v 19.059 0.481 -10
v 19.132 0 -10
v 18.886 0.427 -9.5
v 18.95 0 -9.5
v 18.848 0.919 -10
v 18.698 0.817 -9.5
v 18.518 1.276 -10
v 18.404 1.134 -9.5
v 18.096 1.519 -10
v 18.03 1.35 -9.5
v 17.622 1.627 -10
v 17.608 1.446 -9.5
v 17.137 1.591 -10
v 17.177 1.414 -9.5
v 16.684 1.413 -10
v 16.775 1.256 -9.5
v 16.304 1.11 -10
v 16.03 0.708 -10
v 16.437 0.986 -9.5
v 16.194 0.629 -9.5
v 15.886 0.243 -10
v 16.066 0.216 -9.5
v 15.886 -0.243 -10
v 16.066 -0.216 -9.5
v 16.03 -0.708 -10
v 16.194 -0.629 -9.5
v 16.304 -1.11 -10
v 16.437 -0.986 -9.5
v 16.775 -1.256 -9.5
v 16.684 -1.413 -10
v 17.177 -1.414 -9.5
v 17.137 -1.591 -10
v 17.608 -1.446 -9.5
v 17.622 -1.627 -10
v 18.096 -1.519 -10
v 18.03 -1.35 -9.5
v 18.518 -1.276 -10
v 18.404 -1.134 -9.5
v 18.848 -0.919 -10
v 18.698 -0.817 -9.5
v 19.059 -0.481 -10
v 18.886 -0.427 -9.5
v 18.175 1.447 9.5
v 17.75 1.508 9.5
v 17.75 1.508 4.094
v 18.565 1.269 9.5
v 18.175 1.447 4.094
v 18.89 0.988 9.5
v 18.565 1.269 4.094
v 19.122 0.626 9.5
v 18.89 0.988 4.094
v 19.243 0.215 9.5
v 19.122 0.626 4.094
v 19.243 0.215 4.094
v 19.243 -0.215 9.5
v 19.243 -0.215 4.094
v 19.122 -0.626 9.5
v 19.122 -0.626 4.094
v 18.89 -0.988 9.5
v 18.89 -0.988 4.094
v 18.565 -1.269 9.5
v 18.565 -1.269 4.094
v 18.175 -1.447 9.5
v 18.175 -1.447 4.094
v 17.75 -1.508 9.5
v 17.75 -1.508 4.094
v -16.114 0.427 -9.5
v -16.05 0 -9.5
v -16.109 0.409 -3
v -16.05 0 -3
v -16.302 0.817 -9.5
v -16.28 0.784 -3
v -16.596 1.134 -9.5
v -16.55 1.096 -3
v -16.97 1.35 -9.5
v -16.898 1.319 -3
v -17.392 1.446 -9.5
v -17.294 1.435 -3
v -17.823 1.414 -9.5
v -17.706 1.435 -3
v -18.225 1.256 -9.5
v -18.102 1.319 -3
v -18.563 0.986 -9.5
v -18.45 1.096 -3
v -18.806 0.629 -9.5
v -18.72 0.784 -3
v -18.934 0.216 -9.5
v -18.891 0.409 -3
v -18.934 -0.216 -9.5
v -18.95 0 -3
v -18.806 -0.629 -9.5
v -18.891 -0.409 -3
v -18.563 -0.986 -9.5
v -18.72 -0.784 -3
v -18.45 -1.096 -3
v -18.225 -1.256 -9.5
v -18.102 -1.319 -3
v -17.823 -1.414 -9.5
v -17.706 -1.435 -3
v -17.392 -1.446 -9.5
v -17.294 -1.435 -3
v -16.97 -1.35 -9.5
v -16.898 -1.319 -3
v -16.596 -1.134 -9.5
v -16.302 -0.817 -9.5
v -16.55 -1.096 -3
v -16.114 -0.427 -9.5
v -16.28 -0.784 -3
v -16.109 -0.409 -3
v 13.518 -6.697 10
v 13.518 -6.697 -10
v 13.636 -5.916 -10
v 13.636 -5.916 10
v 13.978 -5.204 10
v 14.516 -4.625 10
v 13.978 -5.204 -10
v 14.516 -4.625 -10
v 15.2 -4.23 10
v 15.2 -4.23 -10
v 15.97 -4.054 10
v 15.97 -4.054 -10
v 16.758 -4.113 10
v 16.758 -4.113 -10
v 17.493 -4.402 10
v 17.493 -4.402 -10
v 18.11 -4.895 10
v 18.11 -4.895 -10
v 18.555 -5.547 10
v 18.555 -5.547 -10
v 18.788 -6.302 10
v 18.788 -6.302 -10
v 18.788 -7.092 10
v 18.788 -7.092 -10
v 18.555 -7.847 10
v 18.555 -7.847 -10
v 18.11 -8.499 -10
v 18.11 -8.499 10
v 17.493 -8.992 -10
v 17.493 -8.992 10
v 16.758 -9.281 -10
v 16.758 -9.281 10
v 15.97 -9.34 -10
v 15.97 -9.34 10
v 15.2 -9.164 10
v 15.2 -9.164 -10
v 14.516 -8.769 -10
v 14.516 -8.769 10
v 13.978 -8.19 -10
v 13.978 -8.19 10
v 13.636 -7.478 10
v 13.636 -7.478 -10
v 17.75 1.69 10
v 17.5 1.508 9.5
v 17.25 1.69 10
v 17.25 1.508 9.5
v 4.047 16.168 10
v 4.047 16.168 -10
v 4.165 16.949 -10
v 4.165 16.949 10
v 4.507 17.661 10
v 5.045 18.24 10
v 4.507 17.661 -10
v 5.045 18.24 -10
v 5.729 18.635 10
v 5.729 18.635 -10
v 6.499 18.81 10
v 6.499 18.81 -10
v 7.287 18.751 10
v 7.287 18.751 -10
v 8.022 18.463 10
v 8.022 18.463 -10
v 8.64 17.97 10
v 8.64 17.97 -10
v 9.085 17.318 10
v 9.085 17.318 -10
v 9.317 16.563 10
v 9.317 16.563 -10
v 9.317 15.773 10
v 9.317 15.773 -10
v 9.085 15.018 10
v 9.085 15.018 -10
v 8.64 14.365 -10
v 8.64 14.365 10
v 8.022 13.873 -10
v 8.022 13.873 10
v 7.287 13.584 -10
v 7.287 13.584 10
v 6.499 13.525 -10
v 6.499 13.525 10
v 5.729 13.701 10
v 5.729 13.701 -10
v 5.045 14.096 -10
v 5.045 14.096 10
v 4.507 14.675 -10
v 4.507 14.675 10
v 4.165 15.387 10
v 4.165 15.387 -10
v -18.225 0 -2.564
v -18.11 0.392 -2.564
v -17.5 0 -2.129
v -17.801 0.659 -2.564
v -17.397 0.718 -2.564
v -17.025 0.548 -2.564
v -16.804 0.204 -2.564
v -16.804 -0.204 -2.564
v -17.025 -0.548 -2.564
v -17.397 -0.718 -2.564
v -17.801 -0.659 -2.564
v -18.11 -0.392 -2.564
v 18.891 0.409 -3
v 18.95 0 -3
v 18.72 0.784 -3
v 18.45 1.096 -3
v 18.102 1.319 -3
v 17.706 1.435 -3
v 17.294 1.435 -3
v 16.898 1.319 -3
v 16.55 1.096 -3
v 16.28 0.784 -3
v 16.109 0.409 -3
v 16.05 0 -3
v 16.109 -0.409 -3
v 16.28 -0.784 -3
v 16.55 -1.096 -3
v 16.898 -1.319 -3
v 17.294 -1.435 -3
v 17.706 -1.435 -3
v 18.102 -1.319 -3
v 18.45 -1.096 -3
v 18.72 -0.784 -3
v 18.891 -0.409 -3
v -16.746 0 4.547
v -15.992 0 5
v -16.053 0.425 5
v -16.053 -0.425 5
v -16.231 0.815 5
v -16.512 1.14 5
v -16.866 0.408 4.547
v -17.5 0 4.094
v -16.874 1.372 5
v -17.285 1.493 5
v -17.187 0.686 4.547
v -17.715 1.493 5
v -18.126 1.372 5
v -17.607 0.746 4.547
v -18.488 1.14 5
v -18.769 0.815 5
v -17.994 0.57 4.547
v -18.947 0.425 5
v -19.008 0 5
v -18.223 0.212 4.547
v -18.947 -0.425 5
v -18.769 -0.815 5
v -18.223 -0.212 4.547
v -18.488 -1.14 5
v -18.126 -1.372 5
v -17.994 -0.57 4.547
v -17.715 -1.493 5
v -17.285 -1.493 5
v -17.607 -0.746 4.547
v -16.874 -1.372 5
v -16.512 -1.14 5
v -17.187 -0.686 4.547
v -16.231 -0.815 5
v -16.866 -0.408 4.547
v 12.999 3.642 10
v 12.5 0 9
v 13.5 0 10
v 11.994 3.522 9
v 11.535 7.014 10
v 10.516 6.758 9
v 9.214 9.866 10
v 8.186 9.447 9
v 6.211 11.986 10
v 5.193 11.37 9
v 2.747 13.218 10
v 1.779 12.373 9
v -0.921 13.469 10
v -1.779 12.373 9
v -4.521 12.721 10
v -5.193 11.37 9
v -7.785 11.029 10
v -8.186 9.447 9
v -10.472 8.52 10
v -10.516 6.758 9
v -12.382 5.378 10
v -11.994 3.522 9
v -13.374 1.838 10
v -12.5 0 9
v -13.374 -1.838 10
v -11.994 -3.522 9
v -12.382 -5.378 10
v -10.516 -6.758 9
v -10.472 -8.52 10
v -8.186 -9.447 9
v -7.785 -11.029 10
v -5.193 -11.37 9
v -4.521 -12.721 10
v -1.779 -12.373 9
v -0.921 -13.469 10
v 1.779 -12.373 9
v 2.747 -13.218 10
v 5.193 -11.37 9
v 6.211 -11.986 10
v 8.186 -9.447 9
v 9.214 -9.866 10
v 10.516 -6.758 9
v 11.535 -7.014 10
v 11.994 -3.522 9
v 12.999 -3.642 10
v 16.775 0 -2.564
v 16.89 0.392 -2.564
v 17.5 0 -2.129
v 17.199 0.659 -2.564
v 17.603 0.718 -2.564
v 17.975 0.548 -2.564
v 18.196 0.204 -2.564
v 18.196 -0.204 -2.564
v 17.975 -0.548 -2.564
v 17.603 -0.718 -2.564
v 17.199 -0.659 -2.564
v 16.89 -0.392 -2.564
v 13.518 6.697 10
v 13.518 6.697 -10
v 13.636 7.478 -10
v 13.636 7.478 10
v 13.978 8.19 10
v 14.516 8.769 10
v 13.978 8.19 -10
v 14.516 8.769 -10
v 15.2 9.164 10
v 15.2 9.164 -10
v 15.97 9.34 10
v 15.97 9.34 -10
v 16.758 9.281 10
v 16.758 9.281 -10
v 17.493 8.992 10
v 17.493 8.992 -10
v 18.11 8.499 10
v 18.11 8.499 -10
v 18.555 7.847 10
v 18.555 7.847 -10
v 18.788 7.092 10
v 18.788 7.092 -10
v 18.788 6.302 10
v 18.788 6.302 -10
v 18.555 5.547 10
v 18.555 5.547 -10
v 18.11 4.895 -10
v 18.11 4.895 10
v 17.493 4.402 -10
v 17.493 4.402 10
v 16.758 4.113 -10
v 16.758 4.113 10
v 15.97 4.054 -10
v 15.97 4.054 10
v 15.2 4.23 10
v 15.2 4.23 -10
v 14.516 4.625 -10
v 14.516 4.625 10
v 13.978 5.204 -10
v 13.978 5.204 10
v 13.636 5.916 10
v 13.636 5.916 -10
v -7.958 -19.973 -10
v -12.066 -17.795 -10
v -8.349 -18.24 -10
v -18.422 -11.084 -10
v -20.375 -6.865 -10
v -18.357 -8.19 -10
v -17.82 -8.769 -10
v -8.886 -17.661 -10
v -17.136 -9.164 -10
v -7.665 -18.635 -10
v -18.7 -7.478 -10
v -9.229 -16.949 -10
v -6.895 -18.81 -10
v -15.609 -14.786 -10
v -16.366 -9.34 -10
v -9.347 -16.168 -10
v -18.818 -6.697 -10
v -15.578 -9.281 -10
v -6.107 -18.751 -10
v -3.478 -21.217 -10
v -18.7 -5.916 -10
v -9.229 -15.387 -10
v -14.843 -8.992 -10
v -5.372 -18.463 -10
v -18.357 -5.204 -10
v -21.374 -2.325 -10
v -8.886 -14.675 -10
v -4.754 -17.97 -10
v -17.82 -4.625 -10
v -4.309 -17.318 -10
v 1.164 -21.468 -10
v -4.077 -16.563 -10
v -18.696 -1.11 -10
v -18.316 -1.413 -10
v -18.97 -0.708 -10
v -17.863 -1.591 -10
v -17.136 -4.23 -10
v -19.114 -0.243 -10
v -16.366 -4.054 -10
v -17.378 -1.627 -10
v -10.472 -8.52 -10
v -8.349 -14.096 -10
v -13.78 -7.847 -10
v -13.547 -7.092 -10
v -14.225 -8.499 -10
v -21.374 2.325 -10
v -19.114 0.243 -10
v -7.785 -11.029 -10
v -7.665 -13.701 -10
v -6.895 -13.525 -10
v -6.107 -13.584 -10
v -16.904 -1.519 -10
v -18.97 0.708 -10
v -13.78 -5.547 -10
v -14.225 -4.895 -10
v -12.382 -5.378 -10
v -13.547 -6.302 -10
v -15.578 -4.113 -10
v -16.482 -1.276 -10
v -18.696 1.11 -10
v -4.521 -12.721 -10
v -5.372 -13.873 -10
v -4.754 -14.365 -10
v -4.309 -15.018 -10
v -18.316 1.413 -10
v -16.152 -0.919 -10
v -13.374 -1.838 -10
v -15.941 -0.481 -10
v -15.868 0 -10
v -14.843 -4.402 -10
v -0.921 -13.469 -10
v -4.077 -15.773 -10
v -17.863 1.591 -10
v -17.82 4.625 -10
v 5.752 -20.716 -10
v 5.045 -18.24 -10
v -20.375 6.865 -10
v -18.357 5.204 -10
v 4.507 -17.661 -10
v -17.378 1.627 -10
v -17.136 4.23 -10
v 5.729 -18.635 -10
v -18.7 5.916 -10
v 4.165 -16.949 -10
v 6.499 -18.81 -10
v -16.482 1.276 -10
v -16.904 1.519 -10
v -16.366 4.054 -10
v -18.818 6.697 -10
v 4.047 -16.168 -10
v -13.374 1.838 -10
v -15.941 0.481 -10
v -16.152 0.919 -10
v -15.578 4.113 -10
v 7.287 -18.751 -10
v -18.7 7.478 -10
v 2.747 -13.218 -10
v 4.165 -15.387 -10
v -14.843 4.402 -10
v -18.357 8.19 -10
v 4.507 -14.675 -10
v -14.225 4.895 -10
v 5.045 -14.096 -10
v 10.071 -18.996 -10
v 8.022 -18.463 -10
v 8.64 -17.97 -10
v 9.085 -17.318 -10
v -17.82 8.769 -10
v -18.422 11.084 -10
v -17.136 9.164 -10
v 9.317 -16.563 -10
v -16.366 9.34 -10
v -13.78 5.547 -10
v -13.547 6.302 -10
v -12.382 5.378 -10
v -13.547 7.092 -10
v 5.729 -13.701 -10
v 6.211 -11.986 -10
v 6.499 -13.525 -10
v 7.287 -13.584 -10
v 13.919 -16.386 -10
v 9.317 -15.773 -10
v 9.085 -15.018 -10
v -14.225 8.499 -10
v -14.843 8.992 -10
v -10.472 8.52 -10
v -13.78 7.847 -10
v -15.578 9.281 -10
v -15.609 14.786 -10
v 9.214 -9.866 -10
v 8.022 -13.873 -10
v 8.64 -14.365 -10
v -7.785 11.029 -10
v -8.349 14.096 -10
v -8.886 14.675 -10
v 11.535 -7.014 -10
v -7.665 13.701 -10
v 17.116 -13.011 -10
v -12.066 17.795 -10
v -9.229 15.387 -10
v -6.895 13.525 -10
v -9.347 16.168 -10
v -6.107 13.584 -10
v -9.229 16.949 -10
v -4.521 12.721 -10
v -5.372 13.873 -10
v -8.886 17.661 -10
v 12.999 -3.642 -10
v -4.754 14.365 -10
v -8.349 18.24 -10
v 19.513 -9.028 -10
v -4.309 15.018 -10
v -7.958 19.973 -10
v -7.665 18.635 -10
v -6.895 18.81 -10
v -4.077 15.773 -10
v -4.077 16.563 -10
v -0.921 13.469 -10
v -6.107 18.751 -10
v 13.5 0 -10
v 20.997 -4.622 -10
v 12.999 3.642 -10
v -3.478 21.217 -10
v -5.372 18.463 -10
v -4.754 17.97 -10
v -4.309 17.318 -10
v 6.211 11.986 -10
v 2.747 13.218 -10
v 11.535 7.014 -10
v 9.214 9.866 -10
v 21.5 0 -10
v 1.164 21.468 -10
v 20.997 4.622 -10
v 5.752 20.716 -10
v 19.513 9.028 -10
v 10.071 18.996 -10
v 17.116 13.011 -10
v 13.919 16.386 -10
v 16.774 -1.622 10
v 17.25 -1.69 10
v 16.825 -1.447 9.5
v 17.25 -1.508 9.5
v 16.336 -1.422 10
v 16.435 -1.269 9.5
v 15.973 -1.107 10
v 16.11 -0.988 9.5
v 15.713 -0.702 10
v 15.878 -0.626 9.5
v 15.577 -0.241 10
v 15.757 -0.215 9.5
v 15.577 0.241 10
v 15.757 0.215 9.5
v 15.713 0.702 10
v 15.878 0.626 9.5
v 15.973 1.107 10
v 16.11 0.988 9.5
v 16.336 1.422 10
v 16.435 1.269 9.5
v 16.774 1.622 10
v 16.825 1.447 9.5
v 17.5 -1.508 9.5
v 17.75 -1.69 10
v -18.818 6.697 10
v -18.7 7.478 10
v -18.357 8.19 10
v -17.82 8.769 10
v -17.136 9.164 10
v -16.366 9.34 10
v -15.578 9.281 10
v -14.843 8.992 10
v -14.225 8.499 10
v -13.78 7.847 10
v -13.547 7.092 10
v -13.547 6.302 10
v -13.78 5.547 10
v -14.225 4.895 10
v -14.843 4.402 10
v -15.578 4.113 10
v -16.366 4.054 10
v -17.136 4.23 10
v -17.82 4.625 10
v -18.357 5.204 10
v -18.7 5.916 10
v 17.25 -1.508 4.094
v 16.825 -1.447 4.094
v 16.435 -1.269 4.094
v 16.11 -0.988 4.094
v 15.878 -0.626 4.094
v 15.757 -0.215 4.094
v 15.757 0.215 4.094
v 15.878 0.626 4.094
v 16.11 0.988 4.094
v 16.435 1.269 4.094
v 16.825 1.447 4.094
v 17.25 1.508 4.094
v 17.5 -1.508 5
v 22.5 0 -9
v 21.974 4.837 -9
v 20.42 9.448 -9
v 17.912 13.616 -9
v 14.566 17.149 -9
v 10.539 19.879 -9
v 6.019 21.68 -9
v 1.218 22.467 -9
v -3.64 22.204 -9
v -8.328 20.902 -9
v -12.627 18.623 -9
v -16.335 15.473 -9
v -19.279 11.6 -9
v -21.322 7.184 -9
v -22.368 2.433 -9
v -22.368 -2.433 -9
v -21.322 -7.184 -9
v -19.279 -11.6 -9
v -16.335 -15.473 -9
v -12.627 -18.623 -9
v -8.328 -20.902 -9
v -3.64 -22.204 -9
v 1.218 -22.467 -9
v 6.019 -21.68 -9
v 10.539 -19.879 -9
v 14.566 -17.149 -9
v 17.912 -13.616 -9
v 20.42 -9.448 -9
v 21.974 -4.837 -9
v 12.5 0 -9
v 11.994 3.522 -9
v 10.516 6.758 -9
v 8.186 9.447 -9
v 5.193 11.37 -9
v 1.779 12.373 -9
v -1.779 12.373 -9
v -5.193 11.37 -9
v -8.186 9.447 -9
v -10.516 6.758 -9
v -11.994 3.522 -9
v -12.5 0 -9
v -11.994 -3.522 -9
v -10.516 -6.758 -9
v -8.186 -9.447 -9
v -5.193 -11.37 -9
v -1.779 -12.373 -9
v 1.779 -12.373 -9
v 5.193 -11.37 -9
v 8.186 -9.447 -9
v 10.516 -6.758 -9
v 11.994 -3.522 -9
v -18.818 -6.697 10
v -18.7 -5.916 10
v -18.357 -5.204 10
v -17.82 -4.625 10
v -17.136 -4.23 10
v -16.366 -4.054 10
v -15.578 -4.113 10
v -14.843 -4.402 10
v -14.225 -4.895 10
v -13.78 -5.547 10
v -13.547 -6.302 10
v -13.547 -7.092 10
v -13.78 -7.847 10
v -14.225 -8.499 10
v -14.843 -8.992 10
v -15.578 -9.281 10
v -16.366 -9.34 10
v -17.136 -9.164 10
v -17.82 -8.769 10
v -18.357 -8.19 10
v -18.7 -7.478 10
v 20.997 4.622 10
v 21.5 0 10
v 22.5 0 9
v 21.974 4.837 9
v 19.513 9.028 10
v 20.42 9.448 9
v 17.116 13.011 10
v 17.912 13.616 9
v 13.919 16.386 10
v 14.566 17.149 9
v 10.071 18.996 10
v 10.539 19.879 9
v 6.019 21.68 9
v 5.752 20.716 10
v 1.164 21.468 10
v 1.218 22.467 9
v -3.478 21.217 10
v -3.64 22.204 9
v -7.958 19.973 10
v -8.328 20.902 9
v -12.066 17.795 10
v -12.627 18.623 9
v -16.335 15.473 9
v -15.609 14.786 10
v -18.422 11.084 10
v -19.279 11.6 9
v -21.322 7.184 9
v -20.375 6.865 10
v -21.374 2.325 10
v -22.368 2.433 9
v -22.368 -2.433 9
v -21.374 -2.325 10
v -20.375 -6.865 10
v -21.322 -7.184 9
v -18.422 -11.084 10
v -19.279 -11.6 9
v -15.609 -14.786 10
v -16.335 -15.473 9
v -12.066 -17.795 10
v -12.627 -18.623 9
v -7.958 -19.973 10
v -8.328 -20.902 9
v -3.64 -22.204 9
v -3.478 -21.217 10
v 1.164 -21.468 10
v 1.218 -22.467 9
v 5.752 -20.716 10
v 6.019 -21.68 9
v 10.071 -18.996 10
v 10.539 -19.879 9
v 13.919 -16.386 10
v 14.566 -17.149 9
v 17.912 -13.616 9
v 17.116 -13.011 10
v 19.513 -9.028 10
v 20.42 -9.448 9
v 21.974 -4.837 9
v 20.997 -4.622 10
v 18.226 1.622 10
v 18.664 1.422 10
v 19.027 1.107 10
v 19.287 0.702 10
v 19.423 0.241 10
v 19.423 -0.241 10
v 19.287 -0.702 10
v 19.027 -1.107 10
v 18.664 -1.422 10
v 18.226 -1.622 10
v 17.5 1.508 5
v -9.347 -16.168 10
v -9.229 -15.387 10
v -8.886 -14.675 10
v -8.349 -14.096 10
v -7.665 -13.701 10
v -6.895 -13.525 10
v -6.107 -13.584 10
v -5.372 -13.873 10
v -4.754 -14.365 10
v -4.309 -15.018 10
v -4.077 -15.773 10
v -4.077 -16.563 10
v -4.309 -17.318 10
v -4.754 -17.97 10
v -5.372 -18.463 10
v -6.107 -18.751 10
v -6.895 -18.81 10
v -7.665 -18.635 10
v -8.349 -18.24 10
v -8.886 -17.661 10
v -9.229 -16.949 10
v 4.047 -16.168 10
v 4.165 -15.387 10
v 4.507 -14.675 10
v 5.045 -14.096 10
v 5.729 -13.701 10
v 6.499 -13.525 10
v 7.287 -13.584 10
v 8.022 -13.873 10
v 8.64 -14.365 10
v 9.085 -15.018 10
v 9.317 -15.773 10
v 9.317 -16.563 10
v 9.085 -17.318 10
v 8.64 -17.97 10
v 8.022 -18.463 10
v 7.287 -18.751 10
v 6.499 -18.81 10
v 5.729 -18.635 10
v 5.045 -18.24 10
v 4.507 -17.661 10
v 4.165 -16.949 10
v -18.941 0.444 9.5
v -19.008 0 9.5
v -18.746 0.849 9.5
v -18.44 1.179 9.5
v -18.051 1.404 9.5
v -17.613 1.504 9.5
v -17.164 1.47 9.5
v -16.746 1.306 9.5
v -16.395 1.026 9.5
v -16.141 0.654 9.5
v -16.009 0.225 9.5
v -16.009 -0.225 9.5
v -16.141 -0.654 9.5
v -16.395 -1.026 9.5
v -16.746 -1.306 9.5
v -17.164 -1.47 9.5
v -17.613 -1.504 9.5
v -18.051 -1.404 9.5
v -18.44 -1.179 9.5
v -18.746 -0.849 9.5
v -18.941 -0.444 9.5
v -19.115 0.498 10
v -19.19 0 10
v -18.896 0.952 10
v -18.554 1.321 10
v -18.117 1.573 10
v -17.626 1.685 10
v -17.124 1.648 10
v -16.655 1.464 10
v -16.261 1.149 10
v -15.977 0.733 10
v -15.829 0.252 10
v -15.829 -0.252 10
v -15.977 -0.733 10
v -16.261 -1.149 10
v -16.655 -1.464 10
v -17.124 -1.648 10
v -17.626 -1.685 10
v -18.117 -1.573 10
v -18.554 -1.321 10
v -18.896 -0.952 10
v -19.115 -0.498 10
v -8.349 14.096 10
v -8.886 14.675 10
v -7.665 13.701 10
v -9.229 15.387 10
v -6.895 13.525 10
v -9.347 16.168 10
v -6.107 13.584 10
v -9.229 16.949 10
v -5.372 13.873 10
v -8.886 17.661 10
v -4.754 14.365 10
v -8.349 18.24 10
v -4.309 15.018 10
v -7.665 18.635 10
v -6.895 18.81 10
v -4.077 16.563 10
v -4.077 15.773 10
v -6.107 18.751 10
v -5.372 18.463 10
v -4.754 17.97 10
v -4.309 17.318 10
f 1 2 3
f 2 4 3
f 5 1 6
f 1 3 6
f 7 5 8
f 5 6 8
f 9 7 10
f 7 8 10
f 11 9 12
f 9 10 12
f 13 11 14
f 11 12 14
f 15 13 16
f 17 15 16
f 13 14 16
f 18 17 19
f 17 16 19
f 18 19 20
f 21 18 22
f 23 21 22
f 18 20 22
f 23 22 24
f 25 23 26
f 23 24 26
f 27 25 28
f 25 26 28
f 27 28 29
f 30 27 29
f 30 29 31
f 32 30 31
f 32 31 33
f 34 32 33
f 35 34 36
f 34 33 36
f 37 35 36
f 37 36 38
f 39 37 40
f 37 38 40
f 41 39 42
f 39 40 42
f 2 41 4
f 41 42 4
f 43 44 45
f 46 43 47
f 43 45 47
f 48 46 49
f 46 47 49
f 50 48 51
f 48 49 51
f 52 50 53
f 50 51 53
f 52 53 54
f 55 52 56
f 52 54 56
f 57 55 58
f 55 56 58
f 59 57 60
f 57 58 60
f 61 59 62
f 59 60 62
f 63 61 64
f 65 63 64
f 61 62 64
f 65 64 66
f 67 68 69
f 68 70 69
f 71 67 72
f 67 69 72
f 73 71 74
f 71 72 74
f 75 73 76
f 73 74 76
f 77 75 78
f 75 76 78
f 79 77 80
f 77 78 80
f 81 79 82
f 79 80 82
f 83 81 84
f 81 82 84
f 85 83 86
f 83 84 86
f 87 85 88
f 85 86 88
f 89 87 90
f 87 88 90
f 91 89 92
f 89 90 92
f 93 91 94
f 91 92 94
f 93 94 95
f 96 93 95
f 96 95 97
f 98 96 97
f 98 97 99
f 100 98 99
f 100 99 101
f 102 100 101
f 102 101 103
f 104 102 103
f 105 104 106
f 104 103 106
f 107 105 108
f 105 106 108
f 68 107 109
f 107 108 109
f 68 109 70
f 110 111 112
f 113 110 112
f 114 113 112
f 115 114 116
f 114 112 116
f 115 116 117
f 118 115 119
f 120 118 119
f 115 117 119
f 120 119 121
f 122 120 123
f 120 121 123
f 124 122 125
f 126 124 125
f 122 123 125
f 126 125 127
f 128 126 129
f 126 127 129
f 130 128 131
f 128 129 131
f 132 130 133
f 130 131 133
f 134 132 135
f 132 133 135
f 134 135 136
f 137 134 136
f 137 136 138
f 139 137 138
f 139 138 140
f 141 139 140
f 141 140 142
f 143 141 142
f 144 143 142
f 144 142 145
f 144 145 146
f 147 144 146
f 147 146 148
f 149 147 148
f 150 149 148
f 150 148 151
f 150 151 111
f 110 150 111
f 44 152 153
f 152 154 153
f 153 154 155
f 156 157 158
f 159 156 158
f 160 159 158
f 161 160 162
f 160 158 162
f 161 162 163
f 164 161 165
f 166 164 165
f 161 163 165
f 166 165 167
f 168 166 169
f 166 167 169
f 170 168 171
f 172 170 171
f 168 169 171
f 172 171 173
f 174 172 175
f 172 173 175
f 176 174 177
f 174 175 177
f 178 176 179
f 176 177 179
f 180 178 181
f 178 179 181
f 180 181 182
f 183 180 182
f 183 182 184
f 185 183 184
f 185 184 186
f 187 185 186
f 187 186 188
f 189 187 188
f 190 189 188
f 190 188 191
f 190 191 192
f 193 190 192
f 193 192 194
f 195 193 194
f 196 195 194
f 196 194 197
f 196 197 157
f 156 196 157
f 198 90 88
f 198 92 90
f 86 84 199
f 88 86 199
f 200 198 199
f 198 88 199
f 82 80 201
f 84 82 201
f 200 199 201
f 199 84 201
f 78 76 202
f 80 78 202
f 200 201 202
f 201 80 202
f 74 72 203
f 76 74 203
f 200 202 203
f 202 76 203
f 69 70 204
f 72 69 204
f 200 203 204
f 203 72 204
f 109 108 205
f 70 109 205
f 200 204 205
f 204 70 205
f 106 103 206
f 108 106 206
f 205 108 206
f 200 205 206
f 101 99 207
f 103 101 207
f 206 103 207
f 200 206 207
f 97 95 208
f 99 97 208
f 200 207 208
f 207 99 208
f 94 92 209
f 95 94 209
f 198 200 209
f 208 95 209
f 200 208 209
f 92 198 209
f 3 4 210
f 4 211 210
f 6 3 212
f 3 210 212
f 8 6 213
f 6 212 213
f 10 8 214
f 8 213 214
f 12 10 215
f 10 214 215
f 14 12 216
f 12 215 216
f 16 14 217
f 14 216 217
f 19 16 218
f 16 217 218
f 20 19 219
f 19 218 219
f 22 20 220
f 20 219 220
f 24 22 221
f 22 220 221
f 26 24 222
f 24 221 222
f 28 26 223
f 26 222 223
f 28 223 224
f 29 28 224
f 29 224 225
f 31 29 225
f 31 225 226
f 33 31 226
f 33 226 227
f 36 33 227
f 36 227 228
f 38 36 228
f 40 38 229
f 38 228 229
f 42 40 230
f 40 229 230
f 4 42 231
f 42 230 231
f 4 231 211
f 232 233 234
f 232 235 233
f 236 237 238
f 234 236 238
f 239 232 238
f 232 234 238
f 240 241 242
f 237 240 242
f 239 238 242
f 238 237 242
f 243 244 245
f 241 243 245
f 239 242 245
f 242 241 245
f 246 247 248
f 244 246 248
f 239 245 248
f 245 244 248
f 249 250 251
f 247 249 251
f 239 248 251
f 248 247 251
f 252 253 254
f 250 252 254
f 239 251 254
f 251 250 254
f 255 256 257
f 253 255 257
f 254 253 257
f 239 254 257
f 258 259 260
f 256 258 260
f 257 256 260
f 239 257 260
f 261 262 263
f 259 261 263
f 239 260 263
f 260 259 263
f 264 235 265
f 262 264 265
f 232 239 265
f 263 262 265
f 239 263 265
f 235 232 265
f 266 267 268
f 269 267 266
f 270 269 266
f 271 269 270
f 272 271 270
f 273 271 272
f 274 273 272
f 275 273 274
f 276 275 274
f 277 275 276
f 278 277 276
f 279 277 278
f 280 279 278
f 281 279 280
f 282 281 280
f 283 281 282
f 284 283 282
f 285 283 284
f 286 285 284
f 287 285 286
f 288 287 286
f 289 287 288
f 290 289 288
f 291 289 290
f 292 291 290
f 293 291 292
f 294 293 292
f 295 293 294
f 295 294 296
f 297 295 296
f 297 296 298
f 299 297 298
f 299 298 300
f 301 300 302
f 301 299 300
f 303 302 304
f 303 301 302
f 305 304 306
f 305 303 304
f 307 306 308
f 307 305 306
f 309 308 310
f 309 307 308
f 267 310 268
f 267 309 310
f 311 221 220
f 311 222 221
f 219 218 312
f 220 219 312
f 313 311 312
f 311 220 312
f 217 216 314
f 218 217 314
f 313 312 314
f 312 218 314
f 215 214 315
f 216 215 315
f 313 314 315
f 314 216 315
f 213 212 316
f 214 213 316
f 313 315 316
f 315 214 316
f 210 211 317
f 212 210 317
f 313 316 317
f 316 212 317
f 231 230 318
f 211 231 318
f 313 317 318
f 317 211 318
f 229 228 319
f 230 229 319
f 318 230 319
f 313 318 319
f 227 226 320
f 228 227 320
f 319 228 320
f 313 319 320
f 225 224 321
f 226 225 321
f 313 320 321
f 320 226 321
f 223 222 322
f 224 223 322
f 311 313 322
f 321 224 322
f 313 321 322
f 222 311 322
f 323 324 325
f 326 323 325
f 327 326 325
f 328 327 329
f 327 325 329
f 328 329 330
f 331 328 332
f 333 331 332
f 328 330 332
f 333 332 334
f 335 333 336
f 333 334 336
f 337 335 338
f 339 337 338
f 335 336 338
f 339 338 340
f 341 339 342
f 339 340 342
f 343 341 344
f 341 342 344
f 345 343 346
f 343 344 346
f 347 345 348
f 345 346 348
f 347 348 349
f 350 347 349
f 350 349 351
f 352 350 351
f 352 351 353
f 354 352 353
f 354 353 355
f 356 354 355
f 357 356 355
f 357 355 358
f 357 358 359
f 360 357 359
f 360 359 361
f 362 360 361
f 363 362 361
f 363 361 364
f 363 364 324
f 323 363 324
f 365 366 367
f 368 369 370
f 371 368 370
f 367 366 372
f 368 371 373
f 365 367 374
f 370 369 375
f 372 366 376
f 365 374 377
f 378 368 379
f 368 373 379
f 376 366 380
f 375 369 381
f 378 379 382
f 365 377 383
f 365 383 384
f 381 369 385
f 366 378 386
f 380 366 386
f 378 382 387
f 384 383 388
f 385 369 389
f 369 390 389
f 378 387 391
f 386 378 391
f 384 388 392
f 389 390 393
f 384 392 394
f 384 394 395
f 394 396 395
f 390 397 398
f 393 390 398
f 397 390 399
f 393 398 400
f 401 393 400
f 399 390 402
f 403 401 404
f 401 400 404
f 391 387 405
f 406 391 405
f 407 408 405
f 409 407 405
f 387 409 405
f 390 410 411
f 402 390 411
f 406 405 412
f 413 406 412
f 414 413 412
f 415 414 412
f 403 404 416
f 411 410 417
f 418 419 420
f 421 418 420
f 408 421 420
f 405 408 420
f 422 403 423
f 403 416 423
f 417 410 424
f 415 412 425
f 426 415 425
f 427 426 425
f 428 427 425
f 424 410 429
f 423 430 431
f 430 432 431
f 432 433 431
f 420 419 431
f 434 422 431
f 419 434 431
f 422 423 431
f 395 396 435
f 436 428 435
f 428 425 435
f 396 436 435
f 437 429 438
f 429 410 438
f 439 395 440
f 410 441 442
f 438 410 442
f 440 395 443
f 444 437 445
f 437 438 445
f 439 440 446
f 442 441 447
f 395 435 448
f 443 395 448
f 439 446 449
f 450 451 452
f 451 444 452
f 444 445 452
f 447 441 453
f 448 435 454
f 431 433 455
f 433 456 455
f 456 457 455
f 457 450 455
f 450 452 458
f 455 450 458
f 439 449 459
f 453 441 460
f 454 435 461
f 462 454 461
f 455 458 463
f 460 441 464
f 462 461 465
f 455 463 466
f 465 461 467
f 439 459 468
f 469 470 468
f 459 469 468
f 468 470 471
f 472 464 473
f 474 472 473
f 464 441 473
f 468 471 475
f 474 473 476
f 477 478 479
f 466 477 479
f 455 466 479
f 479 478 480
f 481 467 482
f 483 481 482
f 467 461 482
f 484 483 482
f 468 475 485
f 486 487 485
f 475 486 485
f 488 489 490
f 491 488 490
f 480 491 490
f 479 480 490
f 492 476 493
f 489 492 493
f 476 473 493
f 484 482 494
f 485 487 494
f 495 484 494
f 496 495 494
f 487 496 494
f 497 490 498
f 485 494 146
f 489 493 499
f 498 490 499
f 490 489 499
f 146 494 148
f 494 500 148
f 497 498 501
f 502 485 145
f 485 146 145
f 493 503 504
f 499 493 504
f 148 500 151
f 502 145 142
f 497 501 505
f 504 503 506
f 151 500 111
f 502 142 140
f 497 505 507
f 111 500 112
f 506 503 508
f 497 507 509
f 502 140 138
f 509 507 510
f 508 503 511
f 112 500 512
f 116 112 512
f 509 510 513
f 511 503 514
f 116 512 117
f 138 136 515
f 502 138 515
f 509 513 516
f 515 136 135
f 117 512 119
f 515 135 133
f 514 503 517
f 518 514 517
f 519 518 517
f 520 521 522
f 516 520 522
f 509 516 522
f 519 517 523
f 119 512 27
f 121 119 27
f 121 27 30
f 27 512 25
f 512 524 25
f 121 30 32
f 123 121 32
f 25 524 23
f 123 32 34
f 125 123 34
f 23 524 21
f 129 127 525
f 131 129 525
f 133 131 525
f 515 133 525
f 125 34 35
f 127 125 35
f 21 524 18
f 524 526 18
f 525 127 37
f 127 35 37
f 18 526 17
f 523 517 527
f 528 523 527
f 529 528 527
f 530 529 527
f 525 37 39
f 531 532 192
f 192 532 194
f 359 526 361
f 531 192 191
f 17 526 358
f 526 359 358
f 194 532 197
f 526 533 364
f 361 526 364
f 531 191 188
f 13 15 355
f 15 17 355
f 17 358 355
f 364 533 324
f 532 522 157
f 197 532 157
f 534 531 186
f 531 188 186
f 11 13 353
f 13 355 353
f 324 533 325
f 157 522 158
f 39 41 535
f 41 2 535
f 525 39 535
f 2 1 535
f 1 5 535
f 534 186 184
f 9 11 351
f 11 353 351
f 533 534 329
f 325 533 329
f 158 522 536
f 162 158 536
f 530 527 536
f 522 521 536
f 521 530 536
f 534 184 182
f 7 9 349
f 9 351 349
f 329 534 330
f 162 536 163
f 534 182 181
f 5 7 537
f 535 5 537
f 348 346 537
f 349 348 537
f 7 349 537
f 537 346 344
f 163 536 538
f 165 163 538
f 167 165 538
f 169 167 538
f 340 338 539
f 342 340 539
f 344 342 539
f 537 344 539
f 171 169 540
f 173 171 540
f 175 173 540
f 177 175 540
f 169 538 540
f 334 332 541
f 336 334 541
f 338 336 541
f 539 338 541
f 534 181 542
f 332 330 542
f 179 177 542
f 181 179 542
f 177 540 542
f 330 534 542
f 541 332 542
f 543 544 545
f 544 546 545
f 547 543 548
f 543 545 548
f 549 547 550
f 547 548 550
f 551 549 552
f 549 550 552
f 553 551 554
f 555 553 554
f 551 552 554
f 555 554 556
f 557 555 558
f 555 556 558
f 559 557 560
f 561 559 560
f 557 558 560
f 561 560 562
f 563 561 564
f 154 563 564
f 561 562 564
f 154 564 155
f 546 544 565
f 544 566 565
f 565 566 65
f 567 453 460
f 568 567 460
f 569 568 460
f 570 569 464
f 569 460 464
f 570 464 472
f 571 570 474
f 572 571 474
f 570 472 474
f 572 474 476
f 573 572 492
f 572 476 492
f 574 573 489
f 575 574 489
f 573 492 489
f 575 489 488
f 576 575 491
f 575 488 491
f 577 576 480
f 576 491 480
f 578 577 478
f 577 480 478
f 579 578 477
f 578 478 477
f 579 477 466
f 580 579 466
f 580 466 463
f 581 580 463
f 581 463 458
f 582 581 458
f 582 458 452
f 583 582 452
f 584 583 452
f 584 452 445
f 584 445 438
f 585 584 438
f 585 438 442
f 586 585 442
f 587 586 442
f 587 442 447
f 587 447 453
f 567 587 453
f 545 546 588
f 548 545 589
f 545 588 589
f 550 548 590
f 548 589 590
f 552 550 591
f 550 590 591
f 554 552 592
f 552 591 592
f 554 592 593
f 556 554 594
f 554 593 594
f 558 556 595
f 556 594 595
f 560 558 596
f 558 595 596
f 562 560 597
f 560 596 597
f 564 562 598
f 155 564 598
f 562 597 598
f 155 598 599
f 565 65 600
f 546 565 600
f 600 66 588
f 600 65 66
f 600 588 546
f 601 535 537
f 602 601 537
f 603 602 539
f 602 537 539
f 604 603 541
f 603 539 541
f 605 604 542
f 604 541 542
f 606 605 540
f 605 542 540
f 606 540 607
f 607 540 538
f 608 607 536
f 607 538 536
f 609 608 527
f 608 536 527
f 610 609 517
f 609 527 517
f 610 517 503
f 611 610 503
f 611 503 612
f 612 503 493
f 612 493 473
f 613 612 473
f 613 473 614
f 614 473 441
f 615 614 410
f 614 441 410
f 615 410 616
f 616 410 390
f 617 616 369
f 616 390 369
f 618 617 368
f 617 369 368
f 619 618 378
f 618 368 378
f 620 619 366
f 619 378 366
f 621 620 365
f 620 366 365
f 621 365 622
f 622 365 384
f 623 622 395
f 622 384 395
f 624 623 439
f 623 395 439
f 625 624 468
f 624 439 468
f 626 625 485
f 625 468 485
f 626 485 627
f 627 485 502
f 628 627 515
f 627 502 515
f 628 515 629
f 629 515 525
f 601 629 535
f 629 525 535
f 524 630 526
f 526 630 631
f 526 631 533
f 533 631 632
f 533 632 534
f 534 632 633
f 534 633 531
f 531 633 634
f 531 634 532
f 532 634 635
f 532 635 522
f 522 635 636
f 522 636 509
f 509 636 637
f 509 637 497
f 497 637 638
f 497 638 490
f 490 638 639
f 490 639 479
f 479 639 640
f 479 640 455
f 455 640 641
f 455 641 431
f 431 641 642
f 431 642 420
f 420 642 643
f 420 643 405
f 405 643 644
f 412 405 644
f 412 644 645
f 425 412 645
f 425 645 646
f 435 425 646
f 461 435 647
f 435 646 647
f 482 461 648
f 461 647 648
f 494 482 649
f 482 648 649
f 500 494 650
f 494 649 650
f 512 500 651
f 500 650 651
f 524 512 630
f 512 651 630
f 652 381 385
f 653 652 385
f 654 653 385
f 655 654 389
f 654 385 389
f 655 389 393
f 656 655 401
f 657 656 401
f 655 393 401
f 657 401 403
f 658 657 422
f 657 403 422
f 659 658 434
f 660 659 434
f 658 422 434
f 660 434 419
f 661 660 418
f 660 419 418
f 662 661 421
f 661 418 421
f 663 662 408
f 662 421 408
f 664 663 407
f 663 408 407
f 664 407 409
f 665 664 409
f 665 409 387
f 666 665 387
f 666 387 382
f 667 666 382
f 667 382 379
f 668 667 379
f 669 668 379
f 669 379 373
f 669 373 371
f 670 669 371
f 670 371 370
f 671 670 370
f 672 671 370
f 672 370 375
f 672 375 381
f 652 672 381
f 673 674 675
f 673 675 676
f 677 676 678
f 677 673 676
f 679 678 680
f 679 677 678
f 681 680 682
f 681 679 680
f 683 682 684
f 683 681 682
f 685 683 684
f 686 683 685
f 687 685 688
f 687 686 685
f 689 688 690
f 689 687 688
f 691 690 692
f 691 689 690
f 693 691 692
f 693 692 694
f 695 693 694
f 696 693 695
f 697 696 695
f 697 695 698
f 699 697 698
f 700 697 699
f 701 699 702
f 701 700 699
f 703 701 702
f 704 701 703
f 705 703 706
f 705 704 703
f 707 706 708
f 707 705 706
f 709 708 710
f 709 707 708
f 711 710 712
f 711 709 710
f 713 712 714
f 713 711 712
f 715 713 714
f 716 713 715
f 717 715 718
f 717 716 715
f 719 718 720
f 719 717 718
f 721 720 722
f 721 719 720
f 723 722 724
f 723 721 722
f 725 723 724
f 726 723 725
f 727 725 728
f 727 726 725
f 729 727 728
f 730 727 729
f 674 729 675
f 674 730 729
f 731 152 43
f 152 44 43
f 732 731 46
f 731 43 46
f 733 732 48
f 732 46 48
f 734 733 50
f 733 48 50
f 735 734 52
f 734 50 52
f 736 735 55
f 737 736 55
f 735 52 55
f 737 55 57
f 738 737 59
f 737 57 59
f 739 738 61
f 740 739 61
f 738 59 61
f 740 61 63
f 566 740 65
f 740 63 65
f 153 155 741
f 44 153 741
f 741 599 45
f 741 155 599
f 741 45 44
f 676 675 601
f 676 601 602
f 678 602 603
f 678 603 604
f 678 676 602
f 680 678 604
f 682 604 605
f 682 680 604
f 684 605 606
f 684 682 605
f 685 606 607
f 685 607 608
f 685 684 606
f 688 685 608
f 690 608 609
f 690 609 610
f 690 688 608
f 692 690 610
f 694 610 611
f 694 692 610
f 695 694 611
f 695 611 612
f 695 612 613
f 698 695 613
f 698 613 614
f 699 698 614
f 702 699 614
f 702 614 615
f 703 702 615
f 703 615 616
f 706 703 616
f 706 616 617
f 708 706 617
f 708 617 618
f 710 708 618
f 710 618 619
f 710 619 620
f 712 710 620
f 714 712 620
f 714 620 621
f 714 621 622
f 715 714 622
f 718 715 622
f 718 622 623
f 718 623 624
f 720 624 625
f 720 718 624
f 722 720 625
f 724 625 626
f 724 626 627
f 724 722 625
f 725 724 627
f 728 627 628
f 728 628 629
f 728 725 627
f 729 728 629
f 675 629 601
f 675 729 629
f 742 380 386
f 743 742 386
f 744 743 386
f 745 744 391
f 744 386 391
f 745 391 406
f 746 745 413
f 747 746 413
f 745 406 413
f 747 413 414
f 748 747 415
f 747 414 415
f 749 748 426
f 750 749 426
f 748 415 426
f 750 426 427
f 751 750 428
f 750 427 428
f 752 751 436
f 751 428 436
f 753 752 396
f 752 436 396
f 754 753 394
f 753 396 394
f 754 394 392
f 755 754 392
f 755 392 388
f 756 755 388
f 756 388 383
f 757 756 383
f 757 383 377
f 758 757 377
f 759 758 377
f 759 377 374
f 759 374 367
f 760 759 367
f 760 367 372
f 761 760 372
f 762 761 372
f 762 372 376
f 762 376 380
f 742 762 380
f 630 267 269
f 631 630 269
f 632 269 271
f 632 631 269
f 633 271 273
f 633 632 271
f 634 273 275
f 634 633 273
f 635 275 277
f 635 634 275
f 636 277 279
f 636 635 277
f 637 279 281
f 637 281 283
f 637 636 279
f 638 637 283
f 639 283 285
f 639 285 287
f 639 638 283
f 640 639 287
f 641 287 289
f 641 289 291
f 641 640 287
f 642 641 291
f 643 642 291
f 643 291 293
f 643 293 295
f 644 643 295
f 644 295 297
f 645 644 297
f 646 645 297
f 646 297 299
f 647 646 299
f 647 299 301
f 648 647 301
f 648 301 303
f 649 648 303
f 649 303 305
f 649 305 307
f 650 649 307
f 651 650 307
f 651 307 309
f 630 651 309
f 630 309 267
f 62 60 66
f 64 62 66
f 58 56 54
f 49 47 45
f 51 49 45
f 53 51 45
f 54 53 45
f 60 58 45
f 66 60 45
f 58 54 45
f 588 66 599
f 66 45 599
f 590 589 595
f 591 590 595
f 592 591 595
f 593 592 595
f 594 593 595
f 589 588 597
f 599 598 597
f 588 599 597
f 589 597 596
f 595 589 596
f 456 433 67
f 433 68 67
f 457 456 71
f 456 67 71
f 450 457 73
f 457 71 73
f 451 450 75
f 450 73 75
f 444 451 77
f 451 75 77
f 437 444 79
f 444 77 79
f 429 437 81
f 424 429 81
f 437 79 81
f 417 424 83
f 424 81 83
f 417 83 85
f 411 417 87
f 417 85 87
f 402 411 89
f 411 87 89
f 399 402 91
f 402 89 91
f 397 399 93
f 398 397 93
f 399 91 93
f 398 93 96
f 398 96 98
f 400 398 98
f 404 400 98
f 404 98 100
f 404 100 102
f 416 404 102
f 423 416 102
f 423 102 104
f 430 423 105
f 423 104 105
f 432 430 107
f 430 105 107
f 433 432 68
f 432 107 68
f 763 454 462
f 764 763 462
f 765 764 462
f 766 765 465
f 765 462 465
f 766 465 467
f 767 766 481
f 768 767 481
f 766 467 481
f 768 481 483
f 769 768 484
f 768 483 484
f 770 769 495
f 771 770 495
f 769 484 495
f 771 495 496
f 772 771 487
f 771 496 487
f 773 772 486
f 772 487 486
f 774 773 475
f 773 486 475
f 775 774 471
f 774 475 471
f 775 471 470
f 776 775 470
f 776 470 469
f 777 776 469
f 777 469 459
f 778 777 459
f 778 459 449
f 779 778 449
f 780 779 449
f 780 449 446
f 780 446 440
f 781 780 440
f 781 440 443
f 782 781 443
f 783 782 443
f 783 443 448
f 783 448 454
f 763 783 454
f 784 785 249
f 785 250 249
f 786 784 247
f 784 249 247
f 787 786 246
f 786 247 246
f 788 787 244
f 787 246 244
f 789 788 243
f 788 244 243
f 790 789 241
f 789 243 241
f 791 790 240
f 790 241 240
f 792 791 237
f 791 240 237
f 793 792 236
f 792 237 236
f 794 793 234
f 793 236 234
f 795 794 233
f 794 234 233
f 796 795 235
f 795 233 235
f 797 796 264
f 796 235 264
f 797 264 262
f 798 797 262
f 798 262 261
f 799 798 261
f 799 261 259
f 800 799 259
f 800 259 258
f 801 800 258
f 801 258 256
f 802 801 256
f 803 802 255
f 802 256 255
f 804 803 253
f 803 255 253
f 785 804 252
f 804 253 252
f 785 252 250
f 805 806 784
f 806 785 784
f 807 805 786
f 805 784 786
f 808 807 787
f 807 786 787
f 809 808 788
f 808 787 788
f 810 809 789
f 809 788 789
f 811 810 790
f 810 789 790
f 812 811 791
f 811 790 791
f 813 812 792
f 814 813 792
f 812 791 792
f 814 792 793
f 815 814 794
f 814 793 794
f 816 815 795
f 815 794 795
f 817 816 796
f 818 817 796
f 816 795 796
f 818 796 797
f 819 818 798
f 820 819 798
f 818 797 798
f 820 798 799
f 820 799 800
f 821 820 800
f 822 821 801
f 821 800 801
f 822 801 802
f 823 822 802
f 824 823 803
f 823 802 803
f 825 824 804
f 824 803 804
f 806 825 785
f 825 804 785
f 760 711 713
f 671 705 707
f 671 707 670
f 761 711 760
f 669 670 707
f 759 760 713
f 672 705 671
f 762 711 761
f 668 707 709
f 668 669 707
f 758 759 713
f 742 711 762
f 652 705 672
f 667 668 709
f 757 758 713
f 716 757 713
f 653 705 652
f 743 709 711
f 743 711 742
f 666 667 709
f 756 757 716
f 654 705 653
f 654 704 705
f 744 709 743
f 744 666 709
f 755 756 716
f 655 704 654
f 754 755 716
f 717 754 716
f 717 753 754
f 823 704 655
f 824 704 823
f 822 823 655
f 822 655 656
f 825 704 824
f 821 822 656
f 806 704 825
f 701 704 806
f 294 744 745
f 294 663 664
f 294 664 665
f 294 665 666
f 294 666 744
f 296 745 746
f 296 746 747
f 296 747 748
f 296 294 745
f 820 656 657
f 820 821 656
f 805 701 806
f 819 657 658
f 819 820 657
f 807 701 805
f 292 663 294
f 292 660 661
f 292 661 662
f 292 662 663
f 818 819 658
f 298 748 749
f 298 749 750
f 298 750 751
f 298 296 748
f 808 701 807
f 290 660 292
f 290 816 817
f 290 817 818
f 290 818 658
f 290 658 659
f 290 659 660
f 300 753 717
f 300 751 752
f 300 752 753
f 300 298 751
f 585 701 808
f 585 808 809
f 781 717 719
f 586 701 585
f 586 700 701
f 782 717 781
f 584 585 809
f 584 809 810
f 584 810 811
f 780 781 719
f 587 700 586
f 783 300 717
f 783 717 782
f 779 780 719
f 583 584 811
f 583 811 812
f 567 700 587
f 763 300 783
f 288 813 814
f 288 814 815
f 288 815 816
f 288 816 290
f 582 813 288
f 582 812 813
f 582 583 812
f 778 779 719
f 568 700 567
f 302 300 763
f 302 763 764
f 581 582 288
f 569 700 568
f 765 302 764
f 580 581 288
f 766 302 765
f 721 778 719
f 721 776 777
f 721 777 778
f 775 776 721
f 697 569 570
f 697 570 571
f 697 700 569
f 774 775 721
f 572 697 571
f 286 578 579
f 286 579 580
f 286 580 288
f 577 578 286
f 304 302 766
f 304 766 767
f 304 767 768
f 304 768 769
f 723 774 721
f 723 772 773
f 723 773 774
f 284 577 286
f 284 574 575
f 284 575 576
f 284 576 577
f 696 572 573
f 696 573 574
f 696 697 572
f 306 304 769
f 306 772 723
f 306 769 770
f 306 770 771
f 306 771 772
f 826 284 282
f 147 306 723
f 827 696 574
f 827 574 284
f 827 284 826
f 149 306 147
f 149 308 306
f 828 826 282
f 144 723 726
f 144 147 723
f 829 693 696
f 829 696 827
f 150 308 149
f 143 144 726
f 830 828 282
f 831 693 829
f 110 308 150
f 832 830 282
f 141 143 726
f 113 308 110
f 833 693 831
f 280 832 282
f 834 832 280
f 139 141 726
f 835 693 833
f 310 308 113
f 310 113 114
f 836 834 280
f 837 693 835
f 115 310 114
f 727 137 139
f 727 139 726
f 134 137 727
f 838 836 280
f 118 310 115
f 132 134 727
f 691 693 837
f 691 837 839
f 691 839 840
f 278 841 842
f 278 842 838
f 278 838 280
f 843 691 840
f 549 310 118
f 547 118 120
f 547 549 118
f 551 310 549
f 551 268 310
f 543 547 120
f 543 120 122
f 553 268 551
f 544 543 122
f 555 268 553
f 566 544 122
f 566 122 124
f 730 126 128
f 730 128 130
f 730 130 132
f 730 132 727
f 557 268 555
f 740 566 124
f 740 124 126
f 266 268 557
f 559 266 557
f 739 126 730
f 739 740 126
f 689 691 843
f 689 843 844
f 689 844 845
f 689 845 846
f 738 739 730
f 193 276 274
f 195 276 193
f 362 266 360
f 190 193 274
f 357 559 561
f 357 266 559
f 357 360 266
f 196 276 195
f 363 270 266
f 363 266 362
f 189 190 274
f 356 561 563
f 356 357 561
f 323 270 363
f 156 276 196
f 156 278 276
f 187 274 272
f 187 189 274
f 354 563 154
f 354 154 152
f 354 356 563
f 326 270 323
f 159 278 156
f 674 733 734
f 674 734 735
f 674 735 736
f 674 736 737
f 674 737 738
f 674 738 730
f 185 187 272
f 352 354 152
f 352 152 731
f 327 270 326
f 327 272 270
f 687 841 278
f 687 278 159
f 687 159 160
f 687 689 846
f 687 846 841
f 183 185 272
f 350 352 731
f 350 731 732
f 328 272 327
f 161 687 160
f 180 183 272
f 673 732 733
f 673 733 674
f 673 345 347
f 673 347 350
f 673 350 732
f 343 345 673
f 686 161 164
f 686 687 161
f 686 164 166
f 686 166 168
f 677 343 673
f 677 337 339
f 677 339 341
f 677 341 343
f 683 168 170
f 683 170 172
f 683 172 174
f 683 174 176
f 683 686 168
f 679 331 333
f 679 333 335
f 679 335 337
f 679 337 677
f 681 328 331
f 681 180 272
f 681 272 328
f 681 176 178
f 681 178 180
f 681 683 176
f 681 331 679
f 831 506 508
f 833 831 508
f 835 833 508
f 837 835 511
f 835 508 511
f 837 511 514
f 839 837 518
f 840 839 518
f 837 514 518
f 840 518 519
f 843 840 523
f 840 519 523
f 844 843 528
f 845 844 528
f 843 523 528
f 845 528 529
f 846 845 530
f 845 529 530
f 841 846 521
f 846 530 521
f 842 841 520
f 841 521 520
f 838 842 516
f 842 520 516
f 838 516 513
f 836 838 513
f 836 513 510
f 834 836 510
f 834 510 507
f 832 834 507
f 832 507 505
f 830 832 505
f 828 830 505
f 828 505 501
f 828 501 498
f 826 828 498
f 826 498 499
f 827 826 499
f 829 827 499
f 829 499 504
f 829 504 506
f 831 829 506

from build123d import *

# Parameters (mm, degrees)
SKETCH1_R                           = 22.5
SKETCH1_R_2                         = 12.5
BOSS_EXTRUDE1_DEPTH                 = 10
M5_CLEARANCE_HOLE1_D                = 5.3
F_3_0MM_CLEARANCE_DOWEL_HOLE1_D     = 3.016
F_3_0MM_CLEARANCE_DOWEL_HOLE1_DEPTH = 5
F_3_0MM_CLEARANCE_DOWEL_HOLE1_TIP   = 0.906097813
F_2_9_2_9_DIAMETER_HOLE1_D          = 2.9
F_2_9_2_9_DIAMETER_HOLE1_DEPTH      = 7
F_2_9_2_9_DIAMETER_HOLE1_TIP        = 0.871247898
CUT_EXTRUDE1_START                  = -5.906098
CUT_EXTRUDE1_DEPTH                  = 5.906098
CHAMFER1_SIZE                       = 1
CHAMFER2_SIZE                       = 0.181985117
CHAMFER2_SIZE_2                     = 0.5


with BuildPart() as part:
    # Sketch1 → Boss-Extrude1 (new, symmetric)
    with BuildSketch(Plane.XY):
        Circle(SKETCH1_R)
        Circle(SKETCH1_R_2, mode=Mode.SUBTRACT)
    extrude(amount=BOSS_EXTRUDE1_DEPTH, both=True)

    # M5 Clearance Hole1 (through all)
    with Locations(Plane.XY.offset(10)):
        with Locations((6.696960066, -16.167891819), (16.167891819, -6.696960066), (16.167891819, 6.696960066), (6.696960066, 16.167891819), (-6.696960066, 16.167891819), (-16.167891819, 6.696960066), (-16.167891819, -6.696960066), (-6.696960066, -16.167891819)):
            Hole(M5_CLEARANCE_HOLE1_D / 2)

    # Ø3.0mm Clearance Dowel Hole1
    with Locations(Plane.XY.offset(10)):
        with Locations((-17.5, 0), (17.5, 0)):
            Hole(F_3_0MM_CLEARANCE_DOWEL_HOLE1_D / 2, depth=F_3_0MM_CLEARANCE_DOWEL_HOLE1_DEPTH)
            with Locations((0, 0, -(F_3_0MM_CLEARANCE_DOWEL_HOLE1_DEPTH + F_3_0MM_CLEARANCE_DOWEL_HOLE1_TIP / 2))):  # 118° drill point
                Cone(0, F_3_0MM_CLEARANCE_DOWEL_HOLE1_D / 2, F_3_0MM_CLEARANCE_DOWEL_HOLE1_TIP, mode=Mode.SUBTRACT)

    # Ø2.9 (2.9) Diameter Hole1
    with Locations(Plane(origin=(0, 0, -10), x_dir=(-1, 0, 0), z_dir=(0, 0, -1))):
        with Locations((-17.5, 0), (17.5, 0)):
            Hole(F_2_9_2_9_DIAMETER_HOLE1_D / 2, depth=F_2_9_2_9_DIAMETER_HOLE1_DEPTH)
            with Locations((0, 0, -(F_2_9_2_9_DIAMETER_HOLE1_DEPTH + F_2_9_2_9_DIAMETER_HOLE1_TIP / 2))):  # 118° drill point
                Cone(0, F_2_9_2_9_DIAMETER_HOLE1_D / 2, F_2_9_2_9_DIAMETER_HOLE1_TIP, mode=Mode.SUBTRACT)

    # Sketch8 → Cut-Extrude1 (cut)
    with BuildSketch(Plane.XY.offset(10).offset(CUT_EXTRUDE1_START)):
        with BuildLine():
            Line((17.25, 1.508), (17.75, 1.508))
            ThreePointArc((17.75, 1.508), (19.258, 0), (17.75, -1.508))
            Line((17.75, -1.508), (17.25, -1.508))
            ThreePointArc((17.25, -1.508), (15.742, 0), (17.25, 1.508))
        make_face()
    extrude(amount=CUT_EXTRUDE1_DEPTH, mode=Mode.SUBTRACT)

    # Chamfer1
    chamfer1_edges = [part.edges().sort_by_distance(p)[0] for p in [
        (-22.5, 0, -10),
        (-22.5, 0, 10),
        (-12.5, 0, -10),
        (-12.5, 0, 10),
    ]]
    chamfer(chamfer1_edges, length=CHAMFER1_SIZE)

    # Chamfer2
    # the kernel refuses this chamfer: 0.5, 0.181985117 mm, written as the material it takes off along each edge
    with BuildSketch(Plane(origin=(-17.5, 0, 10), x_dir=(-1, 0, 0), z_dir=(0, -1, 0))) as chamfer2_piece_1:
        Polygon((1.508 + CHAMFER2_SIZE, 0), (1.508, CHAMFER2_SIZE_2), (1.508, 0), align=None)
    revolve(axis=Axis((-17.5, 0, 10), (0, 0, -1)), mode=Mode.SUBTRACT)
    with BuildSketch(Plane(origin=(-17.5, 0, -10), x_dir=(1, 0, 0), z_dir=(0, -1, 0))) as chamfer2_piece_2:
        Polygon((1.45 + CHAMFER2_SIZE, 0), (1.45, CHAMFER2_SIZE_2), (1.45, 0), align=None)
    revolve(axis=Axis((-17.5, 0, -10), (0, 0, 1)), mode=Mode.SUBTRACT)
    with BuildSketch(Plane(origin=(17.5, 0, -10), x_dir=(1, 0, 0), z_dir=(0, -1, 0))) as chamfer2_piece_3:
        Polygon((1.45 + CHAMFER2_SIZE, 0), (1.45, CHAMFER2_SIZE_2), (1.45, 0), align=None)
    revolve(axis=Axis((17.5, 0, -10), (0, 0, 1)), mode=Mode.SUBTRACT)
    with BuildSketch(Plane(origin=(17.75, -1.508, 10), x_dir=(0, -0.9950833631817482, 0.09904090225205342), z_dir=(-1, 0, 0)), Plane(origin=(17.5, 1.508, 10), x_dir=(0, 0.9950833631817482, 0.09904090225205342), z_dir=(1, 0, 0)), Plane(origin=(17.5, -1.508, 10), x_dir=(0, -0.9950833631817482, 0.09904090225205342), z_dir=(-1, 0, 0)), Plane(origin=(17.25, 1.508, 10), x_dir=(0, 0.9950833631817482, 0.09904090225205342), z_dir=(1, 0, 0))) as chamfer2_piece_4:
        Polygon((CHAMFER2_SIZE * 0.99508336391, -CHAMFER2_SIZE * 0.0990409023245), (-CHAMFER2_SIZE_2 * 0.0990409022521, -CHAMFER2_SIZE_2 * 0.995083363182), (0, 0), align=None)
    extrude(amount=0.25, mode=Mode.SUBTRACT)
    with BuildSketch(Plane(origin=(17.25, 0, 10), x_dir=(0, -1, 0), z_dir=(1, 0, 0))) as chamfer2_piece_5:
        Polygon((1.508 + CHAMFER2_SIZE, 0), (1.508, CHAMFER2_SIZE_2), (1.508, 0), align=None)
    revolve(axis=Axis((17.25, 0, 10), (0, 0, -1)), revolution_arc=180, mode=Mode.SUBTRACT)
    with BuildSketch(Plane(origin=(17.75, 0, 10), x_dir=(0, 1, 0), z_dir=(-1, 0, 0))) as chamfer2_piece_6:
        Polygon((1.508 + CHAMFER2_SIZE, 0), (1.508, CHAMFER2_SIZE_2), (1.508, 0), align=None)
    revolve(axis=Axis((17.75, 0, 10), (0, 0, -1)), revolution_arc=180, mode=Mode.SUBTRACT)


solid = part.part
